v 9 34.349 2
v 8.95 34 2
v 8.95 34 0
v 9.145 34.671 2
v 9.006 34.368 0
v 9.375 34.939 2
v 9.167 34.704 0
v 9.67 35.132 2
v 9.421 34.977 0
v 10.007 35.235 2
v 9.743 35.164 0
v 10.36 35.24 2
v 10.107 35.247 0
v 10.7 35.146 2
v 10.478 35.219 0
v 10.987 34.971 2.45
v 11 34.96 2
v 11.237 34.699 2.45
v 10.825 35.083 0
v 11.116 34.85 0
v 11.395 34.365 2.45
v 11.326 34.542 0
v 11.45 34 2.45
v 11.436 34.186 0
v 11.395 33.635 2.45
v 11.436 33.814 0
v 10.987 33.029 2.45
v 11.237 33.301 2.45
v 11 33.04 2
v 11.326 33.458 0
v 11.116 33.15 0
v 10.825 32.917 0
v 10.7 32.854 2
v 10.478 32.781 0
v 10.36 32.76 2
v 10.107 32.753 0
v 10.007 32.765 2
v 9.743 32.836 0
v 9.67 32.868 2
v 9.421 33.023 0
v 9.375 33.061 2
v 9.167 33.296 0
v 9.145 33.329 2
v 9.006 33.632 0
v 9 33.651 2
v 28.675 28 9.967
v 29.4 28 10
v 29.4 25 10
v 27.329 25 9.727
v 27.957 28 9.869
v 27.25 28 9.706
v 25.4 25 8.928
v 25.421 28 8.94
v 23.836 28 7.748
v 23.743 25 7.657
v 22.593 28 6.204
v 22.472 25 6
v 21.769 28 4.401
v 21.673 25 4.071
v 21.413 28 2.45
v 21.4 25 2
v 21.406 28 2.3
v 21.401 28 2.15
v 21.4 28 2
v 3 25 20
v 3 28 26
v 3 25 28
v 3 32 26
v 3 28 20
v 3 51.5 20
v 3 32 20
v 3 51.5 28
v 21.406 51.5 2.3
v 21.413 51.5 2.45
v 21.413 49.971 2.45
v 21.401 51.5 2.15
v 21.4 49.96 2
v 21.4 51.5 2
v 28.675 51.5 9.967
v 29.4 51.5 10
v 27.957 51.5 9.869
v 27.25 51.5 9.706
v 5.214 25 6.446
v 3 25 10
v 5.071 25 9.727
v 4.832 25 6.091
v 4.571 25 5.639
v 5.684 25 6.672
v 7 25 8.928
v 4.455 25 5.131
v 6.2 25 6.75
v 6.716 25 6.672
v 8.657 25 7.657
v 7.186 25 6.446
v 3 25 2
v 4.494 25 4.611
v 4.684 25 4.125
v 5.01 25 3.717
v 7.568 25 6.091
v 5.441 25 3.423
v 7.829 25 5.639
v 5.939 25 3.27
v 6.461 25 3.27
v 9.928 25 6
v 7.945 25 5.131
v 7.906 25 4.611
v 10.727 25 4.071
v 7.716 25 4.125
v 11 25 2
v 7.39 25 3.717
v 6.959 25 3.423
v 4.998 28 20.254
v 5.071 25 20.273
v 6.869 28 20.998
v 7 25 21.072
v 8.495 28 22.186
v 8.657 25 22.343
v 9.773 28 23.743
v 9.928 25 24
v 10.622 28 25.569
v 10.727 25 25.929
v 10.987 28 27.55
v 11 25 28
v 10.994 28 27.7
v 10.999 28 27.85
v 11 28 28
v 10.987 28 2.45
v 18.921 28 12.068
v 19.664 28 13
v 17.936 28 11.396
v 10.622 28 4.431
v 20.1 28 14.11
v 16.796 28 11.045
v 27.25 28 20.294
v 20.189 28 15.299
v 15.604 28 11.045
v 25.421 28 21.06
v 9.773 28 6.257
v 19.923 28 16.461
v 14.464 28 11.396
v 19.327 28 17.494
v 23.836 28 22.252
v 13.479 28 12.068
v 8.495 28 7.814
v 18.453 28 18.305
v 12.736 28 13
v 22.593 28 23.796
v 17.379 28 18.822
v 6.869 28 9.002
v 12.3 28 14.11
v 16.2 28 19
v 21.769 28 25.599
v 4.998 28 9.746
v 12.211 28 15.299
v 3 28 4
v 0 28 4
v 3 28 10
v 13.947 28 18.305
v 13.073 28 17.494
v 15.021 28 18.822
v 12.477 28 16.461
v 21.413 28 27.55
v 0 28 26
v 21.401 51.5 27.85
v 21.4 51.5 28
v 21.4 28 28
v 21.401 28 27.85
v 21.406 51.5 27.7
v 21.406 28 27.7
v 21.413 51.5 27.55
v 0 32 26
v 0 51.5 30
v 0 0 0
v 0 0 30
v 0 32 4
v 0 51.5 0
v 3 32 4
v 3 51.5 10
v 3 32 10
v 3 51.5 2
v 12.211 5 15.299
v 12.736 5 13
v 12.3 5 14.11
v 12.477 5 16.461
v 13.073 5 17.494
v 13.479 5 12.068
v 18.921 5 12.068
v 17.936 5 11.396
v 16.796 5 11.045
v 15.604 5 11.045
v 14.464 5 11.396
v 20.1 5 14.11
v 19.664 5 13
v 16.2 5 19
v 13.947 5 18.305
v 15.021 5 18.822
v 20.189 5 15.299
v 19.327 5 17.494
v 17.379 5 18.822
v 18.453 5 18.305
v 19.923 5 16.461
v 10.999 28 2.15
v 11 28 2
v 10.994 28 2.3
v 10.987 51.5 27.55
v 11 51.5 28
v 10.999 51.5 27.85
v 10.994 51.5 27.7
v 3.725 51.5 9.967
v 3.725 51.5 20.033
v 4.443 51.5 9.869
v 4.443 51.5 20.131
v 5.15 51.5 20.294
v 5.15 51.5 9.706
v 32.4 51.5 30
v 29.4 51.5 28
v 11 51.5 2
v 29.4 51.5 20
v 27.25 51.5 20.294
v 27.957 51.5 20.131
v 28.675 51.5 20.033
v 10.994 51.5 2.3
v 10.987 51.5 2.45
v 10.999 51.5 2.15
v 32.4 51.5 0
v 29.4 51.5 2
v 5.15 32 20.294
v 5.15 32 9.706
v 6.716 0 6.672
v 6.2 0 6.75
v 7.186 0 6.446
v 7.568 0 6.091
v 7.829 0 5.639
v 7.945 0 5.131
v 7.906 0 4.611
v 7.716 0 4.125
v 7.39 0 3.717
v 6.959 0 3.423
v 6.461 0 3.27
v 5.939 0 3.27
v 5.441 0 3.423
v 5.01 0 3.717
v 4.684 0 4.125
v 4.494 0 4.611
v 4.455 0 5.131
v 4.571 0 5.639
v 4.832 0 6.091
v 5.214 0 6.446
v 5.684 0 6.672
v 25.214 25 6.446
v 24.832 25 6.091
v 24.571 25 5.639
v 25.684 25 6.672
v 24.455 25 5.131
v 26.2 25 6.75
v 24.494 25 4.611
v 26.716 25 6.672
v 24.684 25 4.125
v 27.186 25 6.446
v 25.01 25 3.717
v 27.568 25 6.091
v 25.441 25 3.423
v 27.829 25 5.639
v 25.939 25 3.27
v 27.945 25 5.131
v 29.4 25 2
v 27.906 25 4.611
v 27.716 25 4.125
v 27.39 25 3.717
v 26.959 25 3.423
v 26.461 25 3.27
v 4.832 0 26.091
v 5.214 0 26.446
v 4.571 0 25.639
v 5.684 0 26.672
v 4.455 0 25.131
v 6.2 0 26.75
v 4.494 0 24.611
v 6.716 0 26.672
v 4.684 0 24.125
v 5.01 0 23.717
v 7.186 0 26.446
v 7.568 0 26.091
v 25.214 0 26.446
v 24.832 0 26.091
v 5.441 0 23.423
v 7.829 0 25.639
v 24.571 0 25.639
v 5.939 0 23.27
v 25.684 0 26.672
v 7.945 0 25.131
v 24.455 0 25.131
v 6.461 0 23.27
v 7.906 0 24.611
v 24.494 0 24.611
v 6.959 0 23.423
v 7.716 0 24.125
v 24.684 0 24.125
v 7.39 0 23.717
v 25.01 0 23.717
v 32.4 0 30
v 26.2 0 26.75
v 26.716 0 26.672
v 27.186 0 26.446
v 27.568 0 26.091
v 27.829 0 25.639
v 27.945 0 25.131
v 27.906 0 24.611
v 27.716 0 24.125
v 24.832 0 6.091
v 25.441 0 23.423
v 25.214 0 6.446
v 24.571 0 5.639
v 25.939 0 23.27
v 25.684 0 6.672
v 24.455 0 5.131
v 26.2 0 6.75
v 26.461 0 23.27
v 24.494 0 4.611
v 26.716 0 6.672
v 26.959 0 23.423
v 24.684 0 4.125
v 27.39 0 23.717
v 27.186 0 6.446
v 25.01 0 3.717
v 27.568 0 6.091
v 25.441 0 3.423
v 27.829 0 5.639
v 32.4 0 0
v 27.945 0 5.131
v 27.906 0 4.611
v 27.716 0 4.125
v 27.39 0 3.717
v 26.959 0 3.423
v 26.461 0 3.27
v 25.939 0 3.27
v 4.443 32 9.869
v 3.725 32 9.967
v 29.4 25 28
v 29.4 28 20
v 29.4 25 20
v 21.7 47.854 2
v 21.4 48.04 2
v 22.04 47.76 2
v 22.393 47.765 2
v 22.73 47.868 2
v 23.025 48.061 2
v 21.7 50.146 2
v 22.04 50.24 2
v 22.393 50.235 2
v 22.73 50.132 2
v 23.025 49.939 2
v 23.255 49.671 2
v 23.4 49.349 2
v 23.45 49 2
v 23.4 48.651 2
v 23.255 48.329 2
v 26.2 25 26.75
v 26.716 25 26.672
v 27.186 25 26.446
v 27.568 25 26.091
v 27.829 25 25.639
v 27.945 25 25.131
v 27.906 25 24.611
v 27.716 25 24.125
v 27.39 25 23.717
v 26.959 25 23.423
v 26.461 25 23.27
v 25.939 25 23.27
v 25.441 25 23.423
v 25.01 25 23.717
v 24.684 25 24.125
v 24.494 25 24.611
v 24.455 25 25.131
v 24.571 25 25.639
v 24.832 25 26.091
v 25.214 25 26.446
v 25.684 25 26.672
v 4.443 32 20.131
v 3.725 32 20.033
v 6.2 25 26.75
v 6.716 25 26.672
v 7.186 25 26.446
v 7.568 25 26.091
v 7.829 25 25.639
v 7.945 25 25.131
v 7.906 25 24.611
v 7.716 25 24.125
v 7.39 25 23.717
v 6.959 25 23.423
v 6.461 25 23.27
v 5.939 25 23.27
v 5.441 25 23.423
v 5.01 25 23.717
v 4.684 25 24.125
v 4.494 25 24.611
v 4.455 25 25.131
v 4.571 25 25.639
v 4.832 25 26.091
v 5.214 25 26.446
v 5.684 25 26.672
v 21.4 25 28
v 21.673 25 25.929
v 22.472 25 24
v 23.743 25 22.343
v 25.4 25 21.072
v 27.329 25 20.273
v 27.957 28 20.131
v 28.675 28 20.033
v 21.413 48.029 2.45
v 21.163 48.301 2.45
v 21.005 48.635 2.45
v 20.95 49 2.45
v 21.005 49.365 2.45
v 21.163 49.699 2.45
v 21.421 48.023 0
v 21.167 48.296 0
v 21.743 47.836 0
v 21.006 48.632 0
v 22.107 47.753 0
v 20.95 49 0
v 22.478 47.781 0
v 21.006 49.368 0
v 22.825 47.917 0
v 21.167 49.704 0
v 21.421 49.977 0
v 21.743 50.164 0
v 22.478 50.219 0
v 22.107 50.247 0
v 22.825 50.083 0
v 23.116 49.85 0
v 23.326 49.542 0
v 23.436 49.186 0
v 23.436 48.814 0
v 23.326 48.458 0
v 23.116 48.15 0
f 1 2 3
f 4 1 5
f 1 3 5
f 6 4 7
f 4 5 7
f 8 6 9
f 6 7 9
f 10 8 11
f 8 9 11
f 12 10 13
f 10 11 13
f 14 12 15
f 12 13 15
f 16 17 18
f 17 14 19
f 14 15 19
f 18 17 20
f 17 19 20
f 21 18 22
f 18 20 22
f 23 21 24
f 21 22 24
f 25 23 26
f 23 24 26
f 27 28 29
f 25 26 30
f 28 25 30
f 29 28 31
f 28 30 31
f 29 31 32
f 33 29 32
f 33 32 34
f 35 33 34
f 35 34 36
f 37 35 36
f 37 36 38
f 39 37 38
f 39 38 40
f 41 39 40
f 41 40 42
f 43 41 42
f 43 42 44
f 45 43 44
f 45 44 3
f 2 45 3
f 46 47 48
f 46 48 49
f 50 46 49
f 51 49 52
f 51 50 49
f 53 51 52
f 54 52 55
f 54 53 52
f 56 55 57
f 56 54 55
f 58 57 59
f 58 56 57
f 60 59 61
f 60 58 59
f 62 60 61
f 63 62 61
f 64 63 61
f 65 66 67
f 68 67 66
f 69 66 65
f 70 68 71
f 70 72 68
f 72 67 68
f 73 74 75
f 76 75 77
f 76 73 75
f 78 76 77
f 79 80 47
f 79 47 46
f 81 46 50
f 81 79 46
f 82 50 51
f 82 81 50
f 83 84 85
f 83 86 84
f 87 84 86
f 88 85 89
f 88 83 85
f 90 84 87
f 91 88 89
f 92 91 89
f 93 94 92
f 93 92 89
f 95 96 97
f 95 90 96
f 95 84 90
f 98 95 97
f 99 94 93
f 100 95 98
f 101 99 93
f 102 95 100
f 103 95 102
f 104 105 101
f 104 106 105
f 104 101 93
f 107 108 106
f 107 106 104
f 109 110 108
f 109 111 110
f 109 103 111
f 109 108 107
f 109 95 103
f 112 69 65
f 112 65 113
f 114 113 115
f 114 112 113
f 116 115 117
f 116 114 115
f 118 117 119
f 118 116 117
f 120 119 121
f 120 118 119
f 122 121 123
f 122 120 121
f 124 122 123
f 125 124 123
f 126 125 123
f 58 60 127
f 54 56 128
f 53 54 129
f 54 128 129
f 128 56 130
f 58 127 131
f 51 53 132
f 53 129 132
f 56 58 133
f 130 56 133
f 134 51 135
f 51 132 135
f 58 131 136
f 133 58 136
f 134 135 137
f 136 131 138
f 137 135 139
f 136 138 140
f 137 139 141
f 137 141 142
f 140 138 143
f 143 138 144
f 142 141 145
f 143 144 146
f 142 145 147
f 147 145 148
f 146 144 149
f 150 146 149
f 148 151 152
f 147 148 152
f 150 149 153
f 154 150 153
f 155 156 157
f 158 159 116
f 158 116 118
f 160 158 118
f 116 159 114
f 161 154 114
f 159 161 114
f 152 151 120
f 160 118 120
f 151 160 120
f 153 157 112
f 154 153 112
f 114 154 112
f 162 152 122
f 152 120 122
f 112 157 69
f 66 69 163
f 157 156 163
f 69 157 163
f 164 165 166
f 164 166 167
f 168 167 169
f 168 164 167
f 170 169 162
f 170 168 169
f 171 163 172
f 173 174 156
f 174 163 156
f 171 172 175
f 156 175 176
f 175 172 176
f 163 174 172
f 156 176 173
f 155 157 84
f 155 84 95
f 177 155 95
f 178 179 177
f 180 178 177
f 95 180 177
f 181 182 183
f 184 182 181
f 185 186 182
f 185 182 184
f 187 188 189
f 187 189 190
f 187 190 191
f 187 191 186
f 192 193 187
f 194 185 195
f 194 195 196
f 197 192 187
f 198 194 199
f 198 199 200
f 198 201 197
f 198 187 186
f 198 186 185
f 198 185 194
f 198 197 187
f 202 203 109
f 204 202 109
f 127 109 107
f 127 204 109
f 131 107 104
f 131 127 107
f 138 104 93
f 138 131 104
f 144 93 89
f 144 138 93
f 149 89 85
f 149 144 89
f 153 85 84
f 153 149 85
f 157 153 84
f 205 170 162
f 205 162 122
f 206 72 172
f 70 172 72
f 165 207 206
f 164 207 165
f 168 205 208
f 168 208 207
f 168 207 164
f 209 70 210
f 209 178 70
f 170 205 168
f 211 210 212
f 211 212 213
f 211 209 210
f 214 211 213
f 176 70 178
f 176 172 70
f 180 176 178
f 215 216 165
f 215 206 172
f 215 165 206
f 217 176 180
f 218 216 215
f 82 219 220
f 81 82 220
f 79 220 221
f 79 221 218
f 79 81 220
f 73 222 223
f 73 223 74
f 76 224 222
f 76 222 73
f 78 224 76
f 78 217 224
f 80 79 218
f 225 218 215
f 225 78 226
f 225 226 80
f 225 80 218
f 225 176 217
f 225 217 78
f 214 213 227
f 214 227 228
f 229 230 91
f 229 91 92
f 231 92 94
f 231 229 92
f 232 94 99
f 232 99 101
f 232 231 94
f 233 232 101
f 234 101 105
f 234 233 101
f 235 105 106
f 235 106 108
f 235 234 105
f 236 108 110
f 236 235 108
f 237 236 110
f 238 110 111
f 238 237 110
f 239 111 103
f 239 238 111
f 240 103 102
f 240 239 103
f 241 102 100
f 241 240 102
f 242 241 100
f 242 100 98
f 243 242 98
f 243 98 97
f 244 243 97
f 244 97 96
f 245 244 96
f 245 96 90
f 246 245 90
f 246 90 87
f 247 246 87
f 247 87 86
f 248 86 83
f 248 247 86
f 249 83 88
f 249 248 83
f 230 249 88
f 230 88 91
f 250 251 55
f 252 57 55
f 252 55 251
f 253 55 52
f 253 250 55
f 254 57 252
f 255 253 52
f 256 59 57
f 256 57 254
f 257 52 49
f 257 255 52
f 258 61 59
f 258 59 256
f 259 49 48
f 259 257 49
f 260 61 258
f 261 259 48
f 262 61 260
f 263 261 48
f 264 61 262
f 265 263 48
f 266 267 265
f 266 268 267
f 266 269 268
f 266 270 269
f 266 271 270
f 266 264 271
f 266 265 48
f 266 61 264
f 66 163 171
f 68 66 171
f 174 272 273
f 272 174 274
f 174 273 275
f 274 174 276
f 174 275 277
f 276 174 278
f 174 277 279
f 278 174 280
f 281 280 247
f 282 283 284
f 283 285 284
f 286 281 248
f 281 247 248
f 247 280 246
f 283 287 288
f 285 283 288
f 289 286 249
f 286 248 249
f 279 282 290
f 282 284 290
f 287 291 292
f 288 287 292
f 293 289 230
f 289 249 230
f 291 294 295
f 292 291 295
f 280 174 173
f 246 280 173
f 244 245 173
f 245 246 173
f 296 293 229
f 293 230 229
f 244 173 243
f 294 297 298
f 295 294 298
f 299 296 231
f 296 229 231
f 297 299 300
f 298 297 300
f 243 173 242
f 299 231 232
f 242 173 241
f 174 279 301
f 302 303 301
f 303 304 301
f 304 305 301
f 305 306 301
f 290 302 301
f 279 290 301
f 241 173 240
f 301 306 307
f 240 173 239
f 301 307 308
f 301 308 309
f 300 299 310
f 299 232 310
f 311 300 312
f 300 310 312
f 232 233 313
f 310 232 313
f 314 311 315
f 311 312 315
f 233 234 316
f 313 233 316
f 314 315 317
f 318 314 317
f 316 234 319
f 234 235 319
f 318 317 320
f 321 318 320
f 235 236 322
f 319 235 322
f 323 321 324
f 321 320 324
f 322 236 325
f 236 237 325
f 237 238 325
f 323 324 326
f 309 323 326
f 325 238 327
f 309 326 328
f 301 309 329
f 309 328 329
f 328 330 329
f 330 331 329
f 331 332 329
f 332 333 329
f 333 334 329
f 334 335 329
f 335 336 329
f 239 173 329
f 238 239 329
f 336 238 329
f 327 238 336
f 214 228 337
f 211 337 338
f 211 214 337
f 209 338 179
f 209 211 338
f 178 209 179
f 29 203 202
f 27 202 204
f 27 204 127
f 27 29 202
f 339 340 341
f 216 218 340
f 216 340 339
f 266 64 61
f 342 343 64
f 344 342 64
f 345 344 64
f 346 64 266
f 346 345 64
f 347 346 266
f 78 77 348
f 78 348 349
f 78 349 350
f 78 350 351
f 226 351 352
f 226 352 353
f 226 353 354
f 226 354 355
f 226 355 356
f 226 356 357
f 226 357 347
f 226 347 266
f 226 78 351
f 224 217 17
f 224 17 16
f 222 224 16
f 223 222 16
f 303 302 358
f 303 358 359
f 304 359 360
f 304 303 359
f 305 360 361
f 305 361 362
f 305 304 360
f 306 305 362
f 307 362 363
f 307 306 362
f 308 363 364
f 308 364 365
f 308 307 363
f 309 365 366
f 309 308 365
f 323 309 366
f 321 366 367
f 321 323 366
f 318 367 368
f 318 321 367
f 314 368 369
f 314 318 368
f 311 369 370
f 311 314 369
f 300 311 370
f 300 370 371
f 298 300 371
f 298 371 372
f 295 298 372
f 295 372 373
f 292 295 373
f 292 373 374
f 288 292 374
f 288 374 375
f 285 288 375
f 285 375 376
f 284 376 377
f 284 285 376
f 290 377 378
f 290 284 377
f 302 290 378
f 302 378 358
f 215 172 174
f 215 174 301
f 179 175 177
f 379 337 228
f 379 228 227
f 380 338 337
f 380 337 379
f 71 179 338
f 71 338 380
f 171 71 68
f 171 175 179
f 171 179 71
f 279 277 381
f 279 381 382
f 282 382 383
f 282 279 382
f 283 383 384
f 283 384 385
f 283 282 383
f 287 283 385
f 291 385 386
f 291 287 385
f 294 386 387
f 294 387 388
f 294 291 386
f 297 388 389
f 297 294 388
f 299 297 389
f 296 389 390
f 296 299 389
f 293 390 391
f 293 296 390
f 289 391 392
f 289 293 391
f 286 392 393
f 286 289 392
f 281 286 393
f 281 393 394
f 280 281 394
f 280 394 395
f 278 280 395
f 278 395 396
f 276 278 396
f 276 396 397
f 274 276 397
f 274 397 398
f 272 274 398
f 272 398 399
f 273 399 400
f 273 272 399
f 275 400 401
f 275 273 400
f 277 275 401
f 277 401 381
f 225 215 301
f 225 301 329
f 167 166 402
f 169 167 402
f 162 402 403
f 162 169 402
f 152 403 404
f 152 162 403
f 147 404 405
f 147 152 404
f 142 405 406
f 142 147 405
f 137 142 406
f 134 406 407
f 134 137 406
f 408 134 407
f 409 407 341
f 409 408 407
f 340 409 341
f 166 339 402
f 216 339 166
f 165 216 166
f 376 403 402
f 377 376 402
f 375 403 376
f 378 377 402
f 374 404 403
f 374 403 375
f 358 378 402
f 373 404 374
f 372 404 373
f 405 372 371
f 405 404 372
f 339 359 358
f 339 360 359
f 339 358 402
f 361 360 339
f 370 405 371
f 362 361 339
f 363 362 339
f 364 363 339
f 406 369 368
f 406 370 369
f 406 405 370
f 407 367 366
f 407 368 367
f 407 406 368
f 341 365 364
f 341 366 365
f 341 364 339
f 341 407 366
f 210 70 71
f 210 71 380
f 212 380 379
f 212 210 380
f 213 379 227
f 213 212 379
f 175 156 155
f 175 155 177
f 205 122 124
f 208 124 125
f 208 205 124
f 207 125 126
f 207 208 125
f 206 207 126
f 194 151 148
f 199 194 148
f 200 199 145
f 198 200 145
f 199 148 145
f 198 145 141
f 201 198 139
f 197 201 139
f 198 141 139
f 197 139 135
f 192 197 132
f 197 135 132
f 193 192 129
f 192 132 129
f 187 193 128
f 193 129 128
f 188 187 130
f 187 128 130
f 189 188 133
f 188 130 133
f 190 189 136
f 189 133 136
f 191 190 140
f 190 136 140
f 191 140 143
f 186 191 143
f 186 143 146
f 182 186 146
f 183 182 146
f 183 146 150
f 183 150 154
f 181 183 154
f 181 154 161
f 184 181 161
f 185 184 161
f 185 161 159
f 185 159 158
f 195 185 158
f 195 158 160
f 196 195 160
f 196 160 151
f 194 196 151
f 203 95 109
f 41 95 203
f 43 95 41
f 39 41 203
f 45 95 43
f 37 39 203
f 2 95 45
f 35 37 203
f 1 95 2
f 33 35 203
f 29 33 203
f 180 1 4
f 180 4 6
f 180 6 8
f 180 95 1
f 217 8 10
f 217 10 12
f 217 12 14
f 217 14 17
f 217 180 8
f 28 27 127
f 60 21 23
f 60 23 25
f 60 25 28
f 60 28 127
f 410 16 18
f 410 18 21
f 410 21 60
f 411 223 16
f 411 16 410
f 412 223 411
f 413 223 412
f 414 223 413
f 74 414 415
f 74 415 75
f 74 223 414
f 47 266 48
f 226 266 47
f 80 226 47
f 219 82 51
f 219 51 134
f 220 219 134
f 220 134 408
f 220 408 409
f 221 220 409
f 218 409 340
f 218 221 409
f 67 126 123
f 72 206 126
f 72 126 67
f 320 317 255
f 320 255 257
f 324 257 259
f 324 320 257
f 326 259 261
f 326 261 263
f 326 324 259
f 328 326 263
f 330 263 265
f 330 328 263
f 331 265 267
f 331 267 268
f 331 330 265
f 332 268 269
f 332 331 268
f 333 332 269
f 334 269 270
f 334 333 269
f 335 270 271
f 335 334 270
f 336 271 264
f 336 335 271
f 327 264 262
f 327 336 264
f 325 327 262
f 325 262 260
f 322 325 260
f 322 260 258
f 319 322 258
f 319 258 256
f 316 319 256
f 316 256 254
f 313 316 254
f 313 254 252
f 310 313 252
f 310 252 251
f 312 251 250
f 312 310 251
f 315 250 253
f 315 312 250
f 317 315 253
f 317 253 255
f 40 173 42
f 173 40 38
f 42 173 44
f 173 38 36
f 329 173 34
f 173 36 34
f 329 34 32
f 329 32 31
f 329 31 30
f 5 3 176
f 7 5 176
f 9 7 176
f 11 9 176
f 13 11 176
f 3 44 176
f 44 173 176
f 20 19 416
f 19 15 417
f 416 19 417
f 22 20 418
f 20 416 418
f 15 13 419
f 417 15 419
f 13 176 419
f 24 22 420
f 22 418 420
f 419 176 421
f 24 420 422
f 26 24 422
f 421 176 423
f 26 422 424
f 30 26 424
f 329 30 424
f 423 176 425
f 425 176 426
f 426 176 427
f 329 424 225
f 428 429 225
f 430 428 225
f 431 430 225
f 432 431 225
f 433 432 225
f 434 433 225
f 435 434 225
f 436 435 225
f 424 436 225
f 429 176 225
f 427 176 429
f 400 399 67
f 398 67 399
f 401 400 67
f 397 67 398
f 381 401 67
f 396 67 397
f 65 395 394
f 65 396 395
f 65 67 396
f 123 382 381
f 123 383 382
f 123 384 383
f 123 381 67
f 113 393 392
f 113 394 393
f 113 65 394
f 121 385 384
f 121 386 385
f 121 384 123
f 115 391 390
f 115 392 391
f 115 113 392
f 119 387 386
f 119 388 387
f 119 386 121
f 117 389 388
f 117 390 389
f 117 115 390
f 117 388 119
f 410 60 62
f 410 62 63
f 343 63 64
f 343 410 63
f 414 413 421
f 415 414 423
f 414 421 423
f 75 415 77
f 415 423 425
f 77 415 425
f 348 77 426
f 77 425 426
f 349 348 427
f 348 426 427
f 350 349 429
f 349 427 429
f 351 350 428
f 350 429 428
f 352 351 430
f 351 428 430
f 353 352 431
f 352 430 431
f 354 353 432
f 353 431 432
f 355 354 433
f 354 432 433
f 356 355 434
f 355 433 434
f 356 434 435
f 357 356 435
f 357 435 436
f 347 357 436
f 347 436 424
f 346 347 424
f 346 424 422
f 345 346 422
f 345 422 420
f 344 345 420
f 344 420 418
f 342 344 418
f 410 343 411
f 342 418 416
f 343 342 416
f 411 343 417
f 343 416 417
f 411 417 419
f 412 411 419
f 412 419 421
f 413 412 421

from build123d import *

# Parameters (mm, degrees)
SKETCH1_W           = 32.4
SKETCH1_H           = 30
SKETCH1_R           = 1.75
BOSS_EXTRUDE1_DEPTH = 25
SKETCH2_R           = 4
CUT_EXTRUDE1_DEPTH  = 20
BOSS_EXTRUDE2_START = 3
SKETCH3_W           = 32.4
SKETCH3_H           = 30
SKETCH3_R           = 4
BOSS_EXTRUDE2_DEPTH = 3
BOSS_EXTRUDE3_START = 23.5
SKETCH4_W           = 32.4
SKETCH4_H           = 30
BOSS_EXTRUDE3_DEPTH = 23.5
SKETCH5_R           = 1.25
CUT_EXTRUDE2_DEPTH  = 2.45
SKETCH6_W           = 22
SKETCH6_H           = 4
CUT_EXTRUDE3_DEPTH  = 5.15


with BuildPart() as part:
    # Sketch1 → Boss-Extrude1 (new body)
    with BuildSketch(Plane(origin=(0, 0, 0), x_dir=(1, 0, 0), z_dir=(0, 1, 0))):
        with Locations((16.2, -15)):
            Rectangle(SKETCH1_W, SKETCH1_H)
        with Locations(Location((6.2, -5, 0), (0, 0, 270))):
            Circle(SKETCH1_R, mode=Mode.SUBTRACT)
        with Locations(Location((26.2, -5, 0), (0, 0, 270))):
            Circle(SKETCH1_R, mode=Mode.SUBTRACT)
        with Locations(Location((26.2, -25, 0), (0, 0, 270))):
            Circle(SKETCH1_R, mode=Mode.SUBTRACT)
        with Locations(Location((6.2, -25, 0), (0, 0, 270))):
            Circle(SKETCH1_R, mode=Mode.SUBTRACT)
    extrude(amount=BOSS_EXTRUDE1_DEPTH)

    # Sketch2 → Cut-Extrude1 (cut)
    with BuildSketch(Plane(origin=(0, 25, 0), x_dir=(1, 0, 0), z_dir=(0, 1, 0))):
        with Locations(Location((16.2, -15, 0), (0, 0, 270))):
            Circle(SKETCH2_R)
    extrude(amount=-CUT_EXTRUDE1_DEPTH, mode=Mode.SUBTRACT)

    # Sketch3 → Boss-Extrude2 (add)
    with BuildSketch(Plane(origin=(0, 25, 0), x_dir=(1, 0, 0), z_dir=(0, 1, 0)).offset(BOSS_EXTRUDE2_START)):
        with Locations((16.2, -15)):
            Rectangle(SKETCH3_W, SKETCH3_H)
        with BuildLine():
            ThreePointArc((11, -2), (8.656854249, -7.656854249), (3, -10))
            Line((3, -10), (3, -2))
            Line((3, -2), (11, -2))
        make_face(mode=Mode.SUBTRACT)
        with BuildLine():
            ThreePointArc((29.4, -10), (23.743145751, -7.656854249), (21.4, -2))
            Line((21.4, -2), (29.4, -2))
            Line((29.4, -2), (29.4, -10))
        make_face(mode=Mode.SUBTRACT)
        with BuildLine():
            ThreePointArc((21.4, -28), (23.743145751, -22.343145751), (29.4, -20))
            Line((29.4, -20), (29.4, -28))
            Line((29.4, -28), (21.4, -28))
        make_face(mode=Mode.SUBTRACT)
        with BuildLine():
            ThreePointArc((3, -20), (8.656854249, -22.343145751), (11, -28))
            Line((11, -28), (3, -28))
            Line((3, -28), (3, -20))
        make_face(mode=Mode.SUBTRACT)
        with Locations(Location((16.2, -15, 0), (0, 0, 270))):
            Circle(SKETCH3_R, mode=Mode.SUBTRACT)
    extrude(amount=-BOSS_EXTRUDE2_DEPTH)

    # Sketch4 → Boss-Extrude3 (add)
    with BuildSketch(Plane(origin=(0, 28, 0), x_dir=(1, 0, 0), z_dir=(0, 1, 0)).offset(BOSS_EXTRUDE3_START)):
        with Locations((16.2, -15)):
            Rectangle(SKETCH4_W, SKETCH4_H)
        with BuildLine():
            Line((5.15, -20.294320277), (5.15, -9.705679723))
            ThreePointArc((5.15, -9.705679723), (4.085025855, -9.926078406), (3, -10))
            Line((3, -10), (3, -2))
            Line((3, -2), (11, -2))
            ThreePointArc((11, -2), (10.996832804, -2.225089113), (10.987333723, -2.45))
            Line((10.987333723, -2.45), (21.412666277, -2.45))
            ThreePointArc((21.412666277, -2.45), (21.403167196, -2.225089113), (21.4, -2))
            Line((21.4, -2), (29.4, -2))
            Line((29.4, -2), (29.4, -10))
            ThreePointArc((29.4, -10), (28.314974145, -9.926078406), (27.25, -9.705679723))
            Line((27.25, -9.705679723), (27.25, -20.294320277))
            ThreePointArc((27.25, -20.294320277), (28.314974145, -20.073921594), (29.4, -20))
            Line((29.4, -20), (29.4, -28))
            Line((29.4, -28), (21.4, -28))
            ThreePointArc((21.4, -28), (21.403167196, -27.774910887), (21.412666277, -27.55))
            Line((21.412666277, -27.55), (10.987333723, -27.55))
            ThreePointArc((10.987333723, -27.55), (10.996832804, -27.774910887), (11, -28))
            Line((11, -28), (3, -28))
            Line((3, -28), (3, -20))
            ThreePointArc((3, -20), (4.085025855, -20.073921594), (5.15, -20.294320277))
        make_face(mode=Mode.SUBTRACT)
    extrude(amount=-BOSS_EXTRUDE3_DEPTH)

    # Sketch5 → Cut-Extrude2 (cut)
    with BuildSketch(Plane(origin=(0, 0, 0), x_dir=(-1, 0, 0), z_dir=(0, 0, -1))):
        with Locations((-22.2, 49)):
            Circle(SKETCH5_R)
        with Locations((-10.2, 34)):
            Circle(SKETCH5_R)
    extrude(amount=-CUT_EXTRUDE2_DEPTH, mode=Mode.SUBTRACT)

    # Sketch6 → Cut-Extrude3 (cut)
    with BuildSketch(Plane.ZY):
        with Locations((15, 30)):
            Rectangle(SKETCH6_W, SKETCH6_H)
    extrude(amount=-CUT_EXTRUDE3_DEPTH, mode=Mode.SUBTRACT)


solid = part.part
